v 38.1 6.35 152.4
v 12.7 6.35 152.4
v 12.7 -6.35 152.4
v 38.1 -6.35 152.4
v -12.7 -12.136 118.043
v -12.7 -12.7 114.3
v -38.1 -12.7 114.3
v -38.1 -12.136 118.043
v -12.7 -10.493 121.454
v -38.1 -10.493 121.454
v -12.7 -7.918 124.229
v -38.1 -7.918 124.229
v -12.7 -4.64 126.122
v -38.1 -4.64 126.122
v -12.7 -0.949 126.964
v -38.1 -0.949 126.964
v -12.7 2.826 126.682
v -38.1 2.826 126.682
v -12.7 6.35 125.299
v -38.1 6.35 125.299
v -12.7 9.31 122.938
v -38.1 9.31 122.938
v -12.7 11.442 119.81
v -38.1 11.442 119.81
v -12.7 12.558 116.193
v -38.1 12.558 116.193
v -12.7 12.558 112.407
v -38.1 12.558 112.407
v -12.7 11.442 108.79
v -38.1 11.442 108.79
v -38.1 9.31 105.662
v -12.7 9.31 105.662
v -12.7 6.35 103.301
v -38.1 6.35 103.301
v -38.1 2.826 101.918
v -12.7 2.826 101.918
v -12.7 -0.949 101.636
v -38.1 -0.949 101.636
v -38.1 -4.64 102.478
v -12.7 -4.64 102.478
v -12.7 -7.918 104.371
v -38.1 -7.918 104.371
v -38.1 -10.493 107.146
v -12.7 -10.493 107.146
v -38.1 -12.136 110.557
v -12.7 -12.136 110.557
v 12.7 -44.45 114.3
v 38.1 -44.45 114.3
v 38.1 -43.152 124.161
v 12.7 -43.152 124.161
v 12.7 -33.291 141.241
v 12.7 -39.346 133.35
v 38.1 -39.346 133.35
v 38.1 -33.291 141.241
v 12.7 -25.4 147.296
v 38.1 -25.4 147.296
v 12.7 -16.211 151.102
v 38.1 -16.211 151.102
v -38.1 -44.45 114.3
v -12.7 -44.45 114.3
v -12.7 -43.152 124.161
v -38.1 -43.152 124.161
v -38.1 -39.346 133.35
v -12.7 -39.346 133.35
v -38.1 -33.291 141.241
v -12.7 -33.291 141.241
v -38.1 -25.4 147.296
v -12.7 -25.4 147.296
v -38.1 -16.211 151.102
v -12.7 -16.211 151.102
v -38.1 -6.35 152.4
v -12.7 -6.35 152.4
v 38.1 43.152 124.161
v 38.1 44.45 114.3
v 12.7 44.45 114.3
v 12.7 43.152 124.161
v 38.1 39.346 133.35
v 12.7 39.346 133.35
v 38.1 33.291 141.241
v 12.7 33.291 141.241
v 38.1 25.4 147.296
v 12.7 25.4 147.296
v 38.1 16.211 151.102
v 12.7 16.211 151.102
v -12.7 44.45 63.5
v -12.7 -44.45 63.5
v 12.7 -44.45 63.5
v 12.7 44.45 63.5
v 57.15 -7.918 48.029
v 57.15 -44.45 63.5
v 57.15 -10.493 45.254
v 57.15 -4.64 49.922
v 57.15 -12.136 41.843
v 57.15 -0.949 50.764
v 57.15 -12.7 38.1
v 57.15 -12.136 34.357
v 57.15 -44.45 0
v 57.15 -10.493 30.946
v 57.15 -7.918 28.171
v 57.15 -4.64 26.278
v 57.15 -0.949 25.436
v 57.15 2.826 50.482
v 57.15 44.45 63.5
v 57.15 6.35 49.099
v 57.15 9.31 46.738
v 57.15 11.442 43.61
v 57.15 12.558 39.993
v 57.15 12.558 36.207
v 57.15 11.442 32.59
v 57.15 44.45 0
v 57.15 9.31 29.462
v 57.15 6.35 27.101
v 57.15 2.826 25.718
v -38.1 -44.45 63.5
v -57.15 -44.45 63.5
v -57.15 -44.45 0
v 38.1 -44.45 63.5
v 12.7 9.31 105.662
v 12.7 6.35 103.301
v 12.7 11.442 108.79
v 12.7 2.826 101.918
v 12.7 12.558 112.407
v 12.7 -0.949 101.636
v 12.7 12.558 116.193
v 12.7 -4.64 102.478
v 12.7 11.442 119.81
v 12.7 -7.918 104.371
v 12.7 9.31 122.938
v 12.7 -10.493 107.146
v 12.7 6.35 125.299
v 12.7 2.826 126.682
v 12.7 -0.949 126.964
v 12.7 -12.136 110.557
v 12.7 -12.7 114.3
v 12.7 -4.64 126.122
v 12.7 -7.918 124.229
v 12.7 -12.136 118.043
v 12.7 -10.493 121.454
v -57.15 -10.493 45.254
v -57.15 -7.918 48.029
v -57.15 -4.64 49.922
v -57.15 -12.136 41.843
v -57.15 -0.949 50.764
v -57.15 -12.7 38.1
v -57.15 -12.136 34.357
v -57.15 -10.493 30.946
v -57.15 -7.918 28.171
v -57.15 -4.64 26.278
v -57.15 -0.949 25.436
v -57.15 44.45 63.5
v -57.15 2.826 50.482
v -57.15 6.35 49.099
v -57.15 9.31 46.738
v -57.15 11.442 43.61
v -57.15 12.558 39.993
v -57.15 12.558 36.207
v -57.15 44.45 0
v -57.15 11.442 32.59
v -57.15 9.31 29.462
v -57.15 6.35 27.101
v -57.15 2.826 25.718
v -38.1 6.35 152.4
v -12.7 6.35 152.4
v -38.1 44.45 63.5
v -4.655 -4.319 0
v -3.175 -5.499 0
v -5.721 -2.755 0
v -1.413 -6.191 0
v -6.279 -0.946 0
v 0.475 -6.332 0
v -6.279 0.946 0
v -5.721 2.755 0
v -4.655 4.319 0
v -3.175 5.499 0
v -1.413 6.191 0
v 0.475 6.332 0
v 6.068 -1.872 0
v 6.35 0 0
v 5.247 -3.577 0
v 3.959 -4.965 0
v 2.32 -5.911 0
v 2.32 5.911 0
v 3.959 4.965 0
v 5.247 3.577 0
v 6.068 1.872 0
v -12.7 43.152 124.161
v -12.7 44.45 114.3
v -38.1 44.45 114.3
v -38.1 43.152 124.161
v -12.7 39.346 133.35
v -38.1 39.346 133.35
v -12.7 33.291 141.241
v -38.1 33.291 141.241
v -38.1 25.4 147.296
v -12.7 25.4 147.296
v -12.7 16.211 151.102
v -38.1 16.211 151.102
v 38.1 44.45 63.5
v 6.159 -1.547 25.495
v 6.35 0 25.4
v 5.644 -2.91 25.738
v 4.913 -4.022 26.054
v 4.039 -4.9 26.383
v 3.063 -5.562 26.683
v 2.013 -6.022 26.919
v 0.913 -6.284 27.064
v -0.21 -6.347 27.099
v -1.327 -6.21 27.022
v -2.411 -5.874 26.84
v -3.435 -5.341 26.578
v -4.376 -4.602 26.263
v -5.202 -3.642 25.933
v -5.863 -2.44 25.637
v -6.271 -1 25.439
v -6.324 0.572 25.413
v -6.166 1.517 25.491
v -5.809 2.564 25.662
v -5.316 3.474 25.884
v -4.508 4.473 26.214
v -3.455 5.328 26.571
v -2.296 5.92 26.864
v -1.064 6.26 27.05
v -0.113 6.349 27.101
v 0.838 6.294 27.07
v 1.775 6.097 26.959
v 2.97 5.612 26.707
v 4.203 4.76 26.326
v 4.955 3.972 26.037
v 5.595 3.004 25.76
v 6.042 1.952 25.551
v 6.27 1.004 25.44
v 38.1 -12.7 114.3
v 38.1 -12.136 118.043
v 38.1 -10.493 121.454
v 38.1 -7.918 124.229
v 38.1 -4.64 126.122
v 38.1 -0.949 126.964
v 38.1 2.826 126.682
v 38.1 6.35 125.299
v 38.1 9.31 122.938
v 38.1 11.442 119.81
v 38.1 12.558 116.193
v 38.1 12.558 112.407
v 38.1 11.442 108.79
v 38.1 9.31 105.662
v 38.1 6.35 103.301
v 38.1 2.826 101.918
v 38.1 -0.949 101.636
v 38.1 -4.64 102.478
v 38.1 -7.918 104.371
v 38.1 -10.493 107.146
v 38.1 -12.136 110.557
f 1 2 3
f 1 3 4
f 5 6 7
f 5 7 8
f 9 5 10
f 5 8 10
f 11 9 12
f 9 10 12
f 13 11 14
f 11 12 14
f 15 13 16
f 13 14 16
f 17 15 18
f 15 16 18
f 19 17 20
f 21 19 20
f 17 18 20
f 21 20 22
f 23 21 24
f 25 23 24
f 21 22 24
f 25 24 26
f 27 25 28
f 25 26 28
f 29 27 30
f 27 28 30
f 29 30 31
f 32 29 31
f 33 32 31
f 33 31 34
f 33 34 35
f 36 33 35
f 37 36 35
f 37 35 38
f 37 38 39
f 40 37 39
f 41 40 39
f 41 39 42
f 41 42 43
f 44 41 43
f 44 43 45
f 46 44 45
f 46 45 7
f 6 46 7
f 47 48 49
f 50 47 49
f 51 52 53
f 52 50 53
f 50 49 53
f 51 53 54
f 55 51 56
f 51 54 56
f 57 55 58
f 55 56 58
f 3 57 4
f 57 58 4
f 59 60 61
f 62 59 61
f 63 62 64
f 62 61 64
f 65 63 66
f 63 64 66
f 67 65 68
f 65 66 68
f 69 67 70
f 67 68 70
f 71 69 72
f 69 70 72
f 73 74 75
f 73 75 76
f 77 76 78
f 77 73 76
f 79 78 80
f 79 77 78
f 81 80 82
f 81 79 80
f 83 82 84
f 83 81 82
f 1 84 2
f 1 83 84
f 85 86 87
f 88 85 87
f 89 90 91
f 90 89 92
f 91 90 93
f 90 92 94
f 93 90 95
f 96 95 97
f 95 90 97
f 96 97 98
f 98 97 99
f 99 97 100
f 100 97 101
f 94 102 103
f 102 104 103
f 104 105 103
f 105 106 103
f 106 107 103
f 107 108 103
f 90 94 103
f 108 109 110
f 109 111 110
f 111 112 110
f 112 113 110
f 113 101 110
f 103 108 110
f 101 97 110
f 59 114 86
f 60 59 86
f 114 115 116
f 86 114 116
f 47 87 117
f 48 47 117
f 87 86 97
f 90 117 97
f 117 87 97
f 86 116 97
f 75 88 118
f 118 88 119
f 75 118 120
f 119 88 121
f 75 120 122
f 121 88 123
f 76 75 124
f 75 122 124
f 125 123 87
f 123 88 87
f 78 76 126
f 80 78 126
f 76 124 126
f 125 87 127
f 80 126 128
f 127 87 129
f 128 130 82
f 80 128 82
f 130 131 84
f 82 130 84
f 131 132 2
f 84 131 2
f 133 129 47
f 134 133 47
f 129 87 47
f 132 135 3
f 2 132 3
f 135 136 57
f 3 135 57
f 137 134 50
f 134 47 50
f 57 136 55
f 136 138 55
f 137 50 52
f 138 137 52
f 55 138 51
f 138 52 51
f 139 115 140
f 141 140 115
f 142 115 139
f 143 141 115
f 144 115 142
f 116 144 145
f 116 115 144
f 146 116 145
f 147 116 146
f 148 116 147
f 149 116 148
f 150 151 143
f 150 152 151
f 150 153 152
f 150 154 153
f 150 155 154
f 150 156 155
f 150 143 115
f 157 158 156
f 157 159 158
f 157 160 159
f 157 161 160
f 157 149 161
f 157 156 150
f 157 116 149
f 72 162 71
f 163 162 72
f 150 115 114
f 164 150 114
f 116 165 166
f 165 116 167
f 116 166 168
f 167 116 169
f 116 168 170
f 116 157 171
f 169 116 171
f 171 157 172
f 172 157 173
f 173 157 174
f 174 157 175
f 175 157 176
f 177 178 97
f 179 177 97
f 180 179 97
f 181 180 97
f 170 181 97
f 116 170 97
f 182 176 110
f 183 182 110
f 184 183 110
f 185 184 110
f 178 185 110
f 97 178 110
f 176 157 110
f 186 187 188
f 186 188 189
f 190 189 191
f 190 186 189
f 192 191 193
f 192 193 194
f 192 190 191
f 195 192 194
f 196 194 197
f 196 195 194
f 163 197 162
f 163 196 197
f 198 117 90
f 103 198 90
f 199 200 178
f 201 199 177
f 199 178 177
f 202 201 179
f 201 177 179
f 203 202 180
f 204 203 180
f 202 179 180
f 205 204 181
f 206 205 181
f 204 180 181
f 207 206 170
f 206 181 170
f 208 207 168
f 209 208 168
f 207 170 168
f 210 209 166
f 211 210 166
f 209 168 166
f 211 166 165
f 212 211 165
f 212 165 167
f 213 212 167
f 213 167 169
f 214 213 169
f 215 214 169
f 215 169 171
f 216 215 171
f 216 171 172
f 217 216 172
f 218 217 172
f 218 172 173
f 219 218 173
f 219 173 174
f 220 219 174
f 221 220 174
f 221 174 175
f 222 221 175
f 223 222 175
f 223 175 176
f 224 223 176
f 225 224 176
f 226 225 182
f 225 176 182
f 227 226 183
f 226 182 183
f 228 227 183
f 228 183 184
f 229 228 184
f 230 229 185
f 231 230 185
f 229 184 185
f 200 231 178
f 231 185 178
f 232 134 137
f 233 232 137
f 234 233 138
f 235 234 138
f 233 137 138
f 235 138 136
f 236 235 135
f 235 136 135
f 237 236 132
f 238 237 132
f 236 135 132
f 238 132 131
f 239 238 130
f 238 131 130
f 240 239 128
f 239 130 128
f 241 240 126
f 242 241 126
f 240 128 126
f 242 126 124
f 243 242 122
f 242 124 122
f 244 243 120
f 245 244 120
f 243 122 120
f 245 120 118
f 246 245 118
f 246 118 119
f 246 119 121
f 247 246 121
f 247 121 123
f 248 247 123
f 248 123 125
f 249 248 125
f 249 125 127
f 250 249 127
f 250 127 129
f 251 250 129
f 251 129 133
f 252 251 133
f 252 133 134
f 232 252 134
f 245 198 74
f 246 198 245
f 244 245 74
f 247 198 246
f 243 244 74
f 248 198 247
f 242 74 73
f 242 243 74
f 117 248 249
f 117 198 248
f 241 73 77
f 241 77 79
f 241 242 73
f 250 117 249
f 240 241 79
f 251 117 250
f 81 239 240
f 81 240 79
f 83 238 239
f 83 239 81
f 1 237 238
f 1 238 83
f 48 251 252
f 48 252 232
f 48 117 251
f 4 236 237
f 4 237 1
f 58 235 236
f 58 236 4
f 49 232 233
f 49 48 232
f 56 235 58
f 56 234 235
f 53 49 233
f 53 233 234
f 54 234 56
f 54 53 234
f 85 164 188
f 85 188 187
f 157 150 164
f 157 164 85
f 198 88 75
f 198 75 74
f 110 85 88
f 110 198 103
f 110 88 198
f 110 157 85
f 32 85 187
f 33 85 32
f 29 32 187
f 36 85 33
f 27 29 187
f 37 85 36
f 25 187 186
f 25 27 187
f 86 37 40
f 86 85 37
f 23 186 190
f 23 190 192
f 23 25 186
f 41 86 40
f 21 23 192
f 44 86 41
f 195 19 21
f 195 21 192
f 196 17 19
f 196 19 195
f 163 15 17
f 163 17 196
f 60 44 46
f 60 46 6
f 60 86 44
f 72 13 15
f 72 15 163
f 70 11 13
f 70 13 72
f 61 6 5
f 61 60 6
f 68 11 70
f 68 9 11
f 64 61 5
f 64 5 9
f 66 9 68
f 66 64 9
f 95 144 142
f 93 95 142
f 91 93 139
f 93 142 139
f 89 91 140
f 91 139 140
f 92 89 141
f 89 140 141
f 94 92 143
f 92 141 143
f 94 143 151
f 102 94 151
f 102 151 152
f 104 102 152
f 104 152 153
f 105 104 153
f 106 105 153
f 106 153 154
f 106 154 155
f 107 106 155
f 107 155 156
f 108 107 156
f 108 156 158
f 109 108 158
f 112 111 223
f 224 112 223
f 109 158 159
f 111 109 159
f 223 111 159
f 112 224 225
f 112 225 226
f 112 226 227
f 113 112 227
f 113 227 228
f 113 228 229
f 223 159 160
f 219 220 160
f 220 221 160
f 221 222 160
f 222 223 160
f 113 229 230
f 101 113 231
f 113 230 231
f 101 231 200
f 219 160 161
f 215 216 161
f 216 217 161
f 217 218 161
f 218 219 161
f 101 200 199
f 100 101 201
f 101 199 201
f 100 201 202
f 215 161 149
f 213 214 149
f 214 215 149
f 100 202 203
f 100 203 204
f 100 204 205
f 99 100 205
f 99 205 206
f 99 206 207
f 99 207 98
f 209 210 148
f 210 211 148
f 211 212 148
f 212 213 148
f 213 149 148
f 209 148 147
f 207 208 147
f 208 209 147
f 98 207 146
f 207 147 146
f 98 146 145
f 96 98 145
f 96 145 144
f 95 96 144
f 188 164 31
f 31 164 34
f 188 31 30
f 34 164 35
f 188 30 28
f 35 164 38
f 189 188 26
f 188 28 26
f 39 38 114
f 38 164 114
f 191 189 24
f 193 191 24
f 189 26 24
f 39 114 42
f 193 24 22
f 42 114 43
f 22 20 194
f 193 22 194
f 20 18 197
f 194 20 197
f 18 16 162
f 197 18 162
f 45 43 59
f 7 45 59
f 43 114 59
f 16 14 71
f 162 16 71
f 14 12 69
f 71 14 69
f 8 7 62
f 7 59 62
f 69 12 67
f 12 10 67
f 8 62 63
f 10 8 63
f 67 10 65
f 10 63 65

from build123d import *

# Parameters (mm, degrees)
F0_W     = 114.3
F0_H     = 88.9
F1_DEPTH = 152.4
F3_R     = 38.1
F4_R     = 12.7
F5_DEPTH = 114.301
F6_R     = 6.35
F7_DEPTH = 38.1
F2_W     = 19.05
F2_H     = 88.9
F2_W_2   = 25.4
F8_DEPTH = 88.901


with BuildPart() as f1:
    # F0 (on Top) → F1 (new body)
    with BuildSketch(Plane.XY):
        Rectangle(F0_W, F0_H)
    extrude(amount=F1_DEPTH)

    # F3
    f3_edges = [f1.edges().sort_by_distance(p)[0] for p in [
        (0, -44.45, 152.4),
        (0, 44.45, 152.4),
    ]]
    fillet(f3_edges, radius=F3_R)

    # F4 (on face) → F5 (cut, through all)
    with BuildSketch(Plane(origin=(-57.15, 0, 0), x_dir=(0, -1, 0), z_dir=(-1, 0, 0))):
        with Locations((0, 38.1)):
            Circle(F4_R)
        with Locations((0, 114.3)):
            Circle(F4_R)
    extrude(amount=-F5_DEPTH, mode=Mode.SUBTRACT)

    # F6 (on face) → F7 (cut)
    with BuildSketch(Plane(origin=(0, 0, 0), x_dir=(1, 0, 0), z_dir=(0, 0, -1))):
        Circle(F6_R)
    extrude(amount=-F7_DEPTH, mode=Mode.SUBTRACT)

    # F2 (on face) → F8 (cut, through all)
    with BuildSketch(Plane.XZ.offset(44.45)):
        with Locations((-47.625, 107.95)):
            Rectangle(F2_W, F2_H)
        with Locations((0, 107.95)):
            Rectangle(F2_W_2, F2_H)
        with Locations((47.625, 107.95)):
            Rectangle(F2_W, F2_H)
    extrude(amount=-F8_DEPTH, mode=Mode.SUBTRACT)


solid = f1.part
